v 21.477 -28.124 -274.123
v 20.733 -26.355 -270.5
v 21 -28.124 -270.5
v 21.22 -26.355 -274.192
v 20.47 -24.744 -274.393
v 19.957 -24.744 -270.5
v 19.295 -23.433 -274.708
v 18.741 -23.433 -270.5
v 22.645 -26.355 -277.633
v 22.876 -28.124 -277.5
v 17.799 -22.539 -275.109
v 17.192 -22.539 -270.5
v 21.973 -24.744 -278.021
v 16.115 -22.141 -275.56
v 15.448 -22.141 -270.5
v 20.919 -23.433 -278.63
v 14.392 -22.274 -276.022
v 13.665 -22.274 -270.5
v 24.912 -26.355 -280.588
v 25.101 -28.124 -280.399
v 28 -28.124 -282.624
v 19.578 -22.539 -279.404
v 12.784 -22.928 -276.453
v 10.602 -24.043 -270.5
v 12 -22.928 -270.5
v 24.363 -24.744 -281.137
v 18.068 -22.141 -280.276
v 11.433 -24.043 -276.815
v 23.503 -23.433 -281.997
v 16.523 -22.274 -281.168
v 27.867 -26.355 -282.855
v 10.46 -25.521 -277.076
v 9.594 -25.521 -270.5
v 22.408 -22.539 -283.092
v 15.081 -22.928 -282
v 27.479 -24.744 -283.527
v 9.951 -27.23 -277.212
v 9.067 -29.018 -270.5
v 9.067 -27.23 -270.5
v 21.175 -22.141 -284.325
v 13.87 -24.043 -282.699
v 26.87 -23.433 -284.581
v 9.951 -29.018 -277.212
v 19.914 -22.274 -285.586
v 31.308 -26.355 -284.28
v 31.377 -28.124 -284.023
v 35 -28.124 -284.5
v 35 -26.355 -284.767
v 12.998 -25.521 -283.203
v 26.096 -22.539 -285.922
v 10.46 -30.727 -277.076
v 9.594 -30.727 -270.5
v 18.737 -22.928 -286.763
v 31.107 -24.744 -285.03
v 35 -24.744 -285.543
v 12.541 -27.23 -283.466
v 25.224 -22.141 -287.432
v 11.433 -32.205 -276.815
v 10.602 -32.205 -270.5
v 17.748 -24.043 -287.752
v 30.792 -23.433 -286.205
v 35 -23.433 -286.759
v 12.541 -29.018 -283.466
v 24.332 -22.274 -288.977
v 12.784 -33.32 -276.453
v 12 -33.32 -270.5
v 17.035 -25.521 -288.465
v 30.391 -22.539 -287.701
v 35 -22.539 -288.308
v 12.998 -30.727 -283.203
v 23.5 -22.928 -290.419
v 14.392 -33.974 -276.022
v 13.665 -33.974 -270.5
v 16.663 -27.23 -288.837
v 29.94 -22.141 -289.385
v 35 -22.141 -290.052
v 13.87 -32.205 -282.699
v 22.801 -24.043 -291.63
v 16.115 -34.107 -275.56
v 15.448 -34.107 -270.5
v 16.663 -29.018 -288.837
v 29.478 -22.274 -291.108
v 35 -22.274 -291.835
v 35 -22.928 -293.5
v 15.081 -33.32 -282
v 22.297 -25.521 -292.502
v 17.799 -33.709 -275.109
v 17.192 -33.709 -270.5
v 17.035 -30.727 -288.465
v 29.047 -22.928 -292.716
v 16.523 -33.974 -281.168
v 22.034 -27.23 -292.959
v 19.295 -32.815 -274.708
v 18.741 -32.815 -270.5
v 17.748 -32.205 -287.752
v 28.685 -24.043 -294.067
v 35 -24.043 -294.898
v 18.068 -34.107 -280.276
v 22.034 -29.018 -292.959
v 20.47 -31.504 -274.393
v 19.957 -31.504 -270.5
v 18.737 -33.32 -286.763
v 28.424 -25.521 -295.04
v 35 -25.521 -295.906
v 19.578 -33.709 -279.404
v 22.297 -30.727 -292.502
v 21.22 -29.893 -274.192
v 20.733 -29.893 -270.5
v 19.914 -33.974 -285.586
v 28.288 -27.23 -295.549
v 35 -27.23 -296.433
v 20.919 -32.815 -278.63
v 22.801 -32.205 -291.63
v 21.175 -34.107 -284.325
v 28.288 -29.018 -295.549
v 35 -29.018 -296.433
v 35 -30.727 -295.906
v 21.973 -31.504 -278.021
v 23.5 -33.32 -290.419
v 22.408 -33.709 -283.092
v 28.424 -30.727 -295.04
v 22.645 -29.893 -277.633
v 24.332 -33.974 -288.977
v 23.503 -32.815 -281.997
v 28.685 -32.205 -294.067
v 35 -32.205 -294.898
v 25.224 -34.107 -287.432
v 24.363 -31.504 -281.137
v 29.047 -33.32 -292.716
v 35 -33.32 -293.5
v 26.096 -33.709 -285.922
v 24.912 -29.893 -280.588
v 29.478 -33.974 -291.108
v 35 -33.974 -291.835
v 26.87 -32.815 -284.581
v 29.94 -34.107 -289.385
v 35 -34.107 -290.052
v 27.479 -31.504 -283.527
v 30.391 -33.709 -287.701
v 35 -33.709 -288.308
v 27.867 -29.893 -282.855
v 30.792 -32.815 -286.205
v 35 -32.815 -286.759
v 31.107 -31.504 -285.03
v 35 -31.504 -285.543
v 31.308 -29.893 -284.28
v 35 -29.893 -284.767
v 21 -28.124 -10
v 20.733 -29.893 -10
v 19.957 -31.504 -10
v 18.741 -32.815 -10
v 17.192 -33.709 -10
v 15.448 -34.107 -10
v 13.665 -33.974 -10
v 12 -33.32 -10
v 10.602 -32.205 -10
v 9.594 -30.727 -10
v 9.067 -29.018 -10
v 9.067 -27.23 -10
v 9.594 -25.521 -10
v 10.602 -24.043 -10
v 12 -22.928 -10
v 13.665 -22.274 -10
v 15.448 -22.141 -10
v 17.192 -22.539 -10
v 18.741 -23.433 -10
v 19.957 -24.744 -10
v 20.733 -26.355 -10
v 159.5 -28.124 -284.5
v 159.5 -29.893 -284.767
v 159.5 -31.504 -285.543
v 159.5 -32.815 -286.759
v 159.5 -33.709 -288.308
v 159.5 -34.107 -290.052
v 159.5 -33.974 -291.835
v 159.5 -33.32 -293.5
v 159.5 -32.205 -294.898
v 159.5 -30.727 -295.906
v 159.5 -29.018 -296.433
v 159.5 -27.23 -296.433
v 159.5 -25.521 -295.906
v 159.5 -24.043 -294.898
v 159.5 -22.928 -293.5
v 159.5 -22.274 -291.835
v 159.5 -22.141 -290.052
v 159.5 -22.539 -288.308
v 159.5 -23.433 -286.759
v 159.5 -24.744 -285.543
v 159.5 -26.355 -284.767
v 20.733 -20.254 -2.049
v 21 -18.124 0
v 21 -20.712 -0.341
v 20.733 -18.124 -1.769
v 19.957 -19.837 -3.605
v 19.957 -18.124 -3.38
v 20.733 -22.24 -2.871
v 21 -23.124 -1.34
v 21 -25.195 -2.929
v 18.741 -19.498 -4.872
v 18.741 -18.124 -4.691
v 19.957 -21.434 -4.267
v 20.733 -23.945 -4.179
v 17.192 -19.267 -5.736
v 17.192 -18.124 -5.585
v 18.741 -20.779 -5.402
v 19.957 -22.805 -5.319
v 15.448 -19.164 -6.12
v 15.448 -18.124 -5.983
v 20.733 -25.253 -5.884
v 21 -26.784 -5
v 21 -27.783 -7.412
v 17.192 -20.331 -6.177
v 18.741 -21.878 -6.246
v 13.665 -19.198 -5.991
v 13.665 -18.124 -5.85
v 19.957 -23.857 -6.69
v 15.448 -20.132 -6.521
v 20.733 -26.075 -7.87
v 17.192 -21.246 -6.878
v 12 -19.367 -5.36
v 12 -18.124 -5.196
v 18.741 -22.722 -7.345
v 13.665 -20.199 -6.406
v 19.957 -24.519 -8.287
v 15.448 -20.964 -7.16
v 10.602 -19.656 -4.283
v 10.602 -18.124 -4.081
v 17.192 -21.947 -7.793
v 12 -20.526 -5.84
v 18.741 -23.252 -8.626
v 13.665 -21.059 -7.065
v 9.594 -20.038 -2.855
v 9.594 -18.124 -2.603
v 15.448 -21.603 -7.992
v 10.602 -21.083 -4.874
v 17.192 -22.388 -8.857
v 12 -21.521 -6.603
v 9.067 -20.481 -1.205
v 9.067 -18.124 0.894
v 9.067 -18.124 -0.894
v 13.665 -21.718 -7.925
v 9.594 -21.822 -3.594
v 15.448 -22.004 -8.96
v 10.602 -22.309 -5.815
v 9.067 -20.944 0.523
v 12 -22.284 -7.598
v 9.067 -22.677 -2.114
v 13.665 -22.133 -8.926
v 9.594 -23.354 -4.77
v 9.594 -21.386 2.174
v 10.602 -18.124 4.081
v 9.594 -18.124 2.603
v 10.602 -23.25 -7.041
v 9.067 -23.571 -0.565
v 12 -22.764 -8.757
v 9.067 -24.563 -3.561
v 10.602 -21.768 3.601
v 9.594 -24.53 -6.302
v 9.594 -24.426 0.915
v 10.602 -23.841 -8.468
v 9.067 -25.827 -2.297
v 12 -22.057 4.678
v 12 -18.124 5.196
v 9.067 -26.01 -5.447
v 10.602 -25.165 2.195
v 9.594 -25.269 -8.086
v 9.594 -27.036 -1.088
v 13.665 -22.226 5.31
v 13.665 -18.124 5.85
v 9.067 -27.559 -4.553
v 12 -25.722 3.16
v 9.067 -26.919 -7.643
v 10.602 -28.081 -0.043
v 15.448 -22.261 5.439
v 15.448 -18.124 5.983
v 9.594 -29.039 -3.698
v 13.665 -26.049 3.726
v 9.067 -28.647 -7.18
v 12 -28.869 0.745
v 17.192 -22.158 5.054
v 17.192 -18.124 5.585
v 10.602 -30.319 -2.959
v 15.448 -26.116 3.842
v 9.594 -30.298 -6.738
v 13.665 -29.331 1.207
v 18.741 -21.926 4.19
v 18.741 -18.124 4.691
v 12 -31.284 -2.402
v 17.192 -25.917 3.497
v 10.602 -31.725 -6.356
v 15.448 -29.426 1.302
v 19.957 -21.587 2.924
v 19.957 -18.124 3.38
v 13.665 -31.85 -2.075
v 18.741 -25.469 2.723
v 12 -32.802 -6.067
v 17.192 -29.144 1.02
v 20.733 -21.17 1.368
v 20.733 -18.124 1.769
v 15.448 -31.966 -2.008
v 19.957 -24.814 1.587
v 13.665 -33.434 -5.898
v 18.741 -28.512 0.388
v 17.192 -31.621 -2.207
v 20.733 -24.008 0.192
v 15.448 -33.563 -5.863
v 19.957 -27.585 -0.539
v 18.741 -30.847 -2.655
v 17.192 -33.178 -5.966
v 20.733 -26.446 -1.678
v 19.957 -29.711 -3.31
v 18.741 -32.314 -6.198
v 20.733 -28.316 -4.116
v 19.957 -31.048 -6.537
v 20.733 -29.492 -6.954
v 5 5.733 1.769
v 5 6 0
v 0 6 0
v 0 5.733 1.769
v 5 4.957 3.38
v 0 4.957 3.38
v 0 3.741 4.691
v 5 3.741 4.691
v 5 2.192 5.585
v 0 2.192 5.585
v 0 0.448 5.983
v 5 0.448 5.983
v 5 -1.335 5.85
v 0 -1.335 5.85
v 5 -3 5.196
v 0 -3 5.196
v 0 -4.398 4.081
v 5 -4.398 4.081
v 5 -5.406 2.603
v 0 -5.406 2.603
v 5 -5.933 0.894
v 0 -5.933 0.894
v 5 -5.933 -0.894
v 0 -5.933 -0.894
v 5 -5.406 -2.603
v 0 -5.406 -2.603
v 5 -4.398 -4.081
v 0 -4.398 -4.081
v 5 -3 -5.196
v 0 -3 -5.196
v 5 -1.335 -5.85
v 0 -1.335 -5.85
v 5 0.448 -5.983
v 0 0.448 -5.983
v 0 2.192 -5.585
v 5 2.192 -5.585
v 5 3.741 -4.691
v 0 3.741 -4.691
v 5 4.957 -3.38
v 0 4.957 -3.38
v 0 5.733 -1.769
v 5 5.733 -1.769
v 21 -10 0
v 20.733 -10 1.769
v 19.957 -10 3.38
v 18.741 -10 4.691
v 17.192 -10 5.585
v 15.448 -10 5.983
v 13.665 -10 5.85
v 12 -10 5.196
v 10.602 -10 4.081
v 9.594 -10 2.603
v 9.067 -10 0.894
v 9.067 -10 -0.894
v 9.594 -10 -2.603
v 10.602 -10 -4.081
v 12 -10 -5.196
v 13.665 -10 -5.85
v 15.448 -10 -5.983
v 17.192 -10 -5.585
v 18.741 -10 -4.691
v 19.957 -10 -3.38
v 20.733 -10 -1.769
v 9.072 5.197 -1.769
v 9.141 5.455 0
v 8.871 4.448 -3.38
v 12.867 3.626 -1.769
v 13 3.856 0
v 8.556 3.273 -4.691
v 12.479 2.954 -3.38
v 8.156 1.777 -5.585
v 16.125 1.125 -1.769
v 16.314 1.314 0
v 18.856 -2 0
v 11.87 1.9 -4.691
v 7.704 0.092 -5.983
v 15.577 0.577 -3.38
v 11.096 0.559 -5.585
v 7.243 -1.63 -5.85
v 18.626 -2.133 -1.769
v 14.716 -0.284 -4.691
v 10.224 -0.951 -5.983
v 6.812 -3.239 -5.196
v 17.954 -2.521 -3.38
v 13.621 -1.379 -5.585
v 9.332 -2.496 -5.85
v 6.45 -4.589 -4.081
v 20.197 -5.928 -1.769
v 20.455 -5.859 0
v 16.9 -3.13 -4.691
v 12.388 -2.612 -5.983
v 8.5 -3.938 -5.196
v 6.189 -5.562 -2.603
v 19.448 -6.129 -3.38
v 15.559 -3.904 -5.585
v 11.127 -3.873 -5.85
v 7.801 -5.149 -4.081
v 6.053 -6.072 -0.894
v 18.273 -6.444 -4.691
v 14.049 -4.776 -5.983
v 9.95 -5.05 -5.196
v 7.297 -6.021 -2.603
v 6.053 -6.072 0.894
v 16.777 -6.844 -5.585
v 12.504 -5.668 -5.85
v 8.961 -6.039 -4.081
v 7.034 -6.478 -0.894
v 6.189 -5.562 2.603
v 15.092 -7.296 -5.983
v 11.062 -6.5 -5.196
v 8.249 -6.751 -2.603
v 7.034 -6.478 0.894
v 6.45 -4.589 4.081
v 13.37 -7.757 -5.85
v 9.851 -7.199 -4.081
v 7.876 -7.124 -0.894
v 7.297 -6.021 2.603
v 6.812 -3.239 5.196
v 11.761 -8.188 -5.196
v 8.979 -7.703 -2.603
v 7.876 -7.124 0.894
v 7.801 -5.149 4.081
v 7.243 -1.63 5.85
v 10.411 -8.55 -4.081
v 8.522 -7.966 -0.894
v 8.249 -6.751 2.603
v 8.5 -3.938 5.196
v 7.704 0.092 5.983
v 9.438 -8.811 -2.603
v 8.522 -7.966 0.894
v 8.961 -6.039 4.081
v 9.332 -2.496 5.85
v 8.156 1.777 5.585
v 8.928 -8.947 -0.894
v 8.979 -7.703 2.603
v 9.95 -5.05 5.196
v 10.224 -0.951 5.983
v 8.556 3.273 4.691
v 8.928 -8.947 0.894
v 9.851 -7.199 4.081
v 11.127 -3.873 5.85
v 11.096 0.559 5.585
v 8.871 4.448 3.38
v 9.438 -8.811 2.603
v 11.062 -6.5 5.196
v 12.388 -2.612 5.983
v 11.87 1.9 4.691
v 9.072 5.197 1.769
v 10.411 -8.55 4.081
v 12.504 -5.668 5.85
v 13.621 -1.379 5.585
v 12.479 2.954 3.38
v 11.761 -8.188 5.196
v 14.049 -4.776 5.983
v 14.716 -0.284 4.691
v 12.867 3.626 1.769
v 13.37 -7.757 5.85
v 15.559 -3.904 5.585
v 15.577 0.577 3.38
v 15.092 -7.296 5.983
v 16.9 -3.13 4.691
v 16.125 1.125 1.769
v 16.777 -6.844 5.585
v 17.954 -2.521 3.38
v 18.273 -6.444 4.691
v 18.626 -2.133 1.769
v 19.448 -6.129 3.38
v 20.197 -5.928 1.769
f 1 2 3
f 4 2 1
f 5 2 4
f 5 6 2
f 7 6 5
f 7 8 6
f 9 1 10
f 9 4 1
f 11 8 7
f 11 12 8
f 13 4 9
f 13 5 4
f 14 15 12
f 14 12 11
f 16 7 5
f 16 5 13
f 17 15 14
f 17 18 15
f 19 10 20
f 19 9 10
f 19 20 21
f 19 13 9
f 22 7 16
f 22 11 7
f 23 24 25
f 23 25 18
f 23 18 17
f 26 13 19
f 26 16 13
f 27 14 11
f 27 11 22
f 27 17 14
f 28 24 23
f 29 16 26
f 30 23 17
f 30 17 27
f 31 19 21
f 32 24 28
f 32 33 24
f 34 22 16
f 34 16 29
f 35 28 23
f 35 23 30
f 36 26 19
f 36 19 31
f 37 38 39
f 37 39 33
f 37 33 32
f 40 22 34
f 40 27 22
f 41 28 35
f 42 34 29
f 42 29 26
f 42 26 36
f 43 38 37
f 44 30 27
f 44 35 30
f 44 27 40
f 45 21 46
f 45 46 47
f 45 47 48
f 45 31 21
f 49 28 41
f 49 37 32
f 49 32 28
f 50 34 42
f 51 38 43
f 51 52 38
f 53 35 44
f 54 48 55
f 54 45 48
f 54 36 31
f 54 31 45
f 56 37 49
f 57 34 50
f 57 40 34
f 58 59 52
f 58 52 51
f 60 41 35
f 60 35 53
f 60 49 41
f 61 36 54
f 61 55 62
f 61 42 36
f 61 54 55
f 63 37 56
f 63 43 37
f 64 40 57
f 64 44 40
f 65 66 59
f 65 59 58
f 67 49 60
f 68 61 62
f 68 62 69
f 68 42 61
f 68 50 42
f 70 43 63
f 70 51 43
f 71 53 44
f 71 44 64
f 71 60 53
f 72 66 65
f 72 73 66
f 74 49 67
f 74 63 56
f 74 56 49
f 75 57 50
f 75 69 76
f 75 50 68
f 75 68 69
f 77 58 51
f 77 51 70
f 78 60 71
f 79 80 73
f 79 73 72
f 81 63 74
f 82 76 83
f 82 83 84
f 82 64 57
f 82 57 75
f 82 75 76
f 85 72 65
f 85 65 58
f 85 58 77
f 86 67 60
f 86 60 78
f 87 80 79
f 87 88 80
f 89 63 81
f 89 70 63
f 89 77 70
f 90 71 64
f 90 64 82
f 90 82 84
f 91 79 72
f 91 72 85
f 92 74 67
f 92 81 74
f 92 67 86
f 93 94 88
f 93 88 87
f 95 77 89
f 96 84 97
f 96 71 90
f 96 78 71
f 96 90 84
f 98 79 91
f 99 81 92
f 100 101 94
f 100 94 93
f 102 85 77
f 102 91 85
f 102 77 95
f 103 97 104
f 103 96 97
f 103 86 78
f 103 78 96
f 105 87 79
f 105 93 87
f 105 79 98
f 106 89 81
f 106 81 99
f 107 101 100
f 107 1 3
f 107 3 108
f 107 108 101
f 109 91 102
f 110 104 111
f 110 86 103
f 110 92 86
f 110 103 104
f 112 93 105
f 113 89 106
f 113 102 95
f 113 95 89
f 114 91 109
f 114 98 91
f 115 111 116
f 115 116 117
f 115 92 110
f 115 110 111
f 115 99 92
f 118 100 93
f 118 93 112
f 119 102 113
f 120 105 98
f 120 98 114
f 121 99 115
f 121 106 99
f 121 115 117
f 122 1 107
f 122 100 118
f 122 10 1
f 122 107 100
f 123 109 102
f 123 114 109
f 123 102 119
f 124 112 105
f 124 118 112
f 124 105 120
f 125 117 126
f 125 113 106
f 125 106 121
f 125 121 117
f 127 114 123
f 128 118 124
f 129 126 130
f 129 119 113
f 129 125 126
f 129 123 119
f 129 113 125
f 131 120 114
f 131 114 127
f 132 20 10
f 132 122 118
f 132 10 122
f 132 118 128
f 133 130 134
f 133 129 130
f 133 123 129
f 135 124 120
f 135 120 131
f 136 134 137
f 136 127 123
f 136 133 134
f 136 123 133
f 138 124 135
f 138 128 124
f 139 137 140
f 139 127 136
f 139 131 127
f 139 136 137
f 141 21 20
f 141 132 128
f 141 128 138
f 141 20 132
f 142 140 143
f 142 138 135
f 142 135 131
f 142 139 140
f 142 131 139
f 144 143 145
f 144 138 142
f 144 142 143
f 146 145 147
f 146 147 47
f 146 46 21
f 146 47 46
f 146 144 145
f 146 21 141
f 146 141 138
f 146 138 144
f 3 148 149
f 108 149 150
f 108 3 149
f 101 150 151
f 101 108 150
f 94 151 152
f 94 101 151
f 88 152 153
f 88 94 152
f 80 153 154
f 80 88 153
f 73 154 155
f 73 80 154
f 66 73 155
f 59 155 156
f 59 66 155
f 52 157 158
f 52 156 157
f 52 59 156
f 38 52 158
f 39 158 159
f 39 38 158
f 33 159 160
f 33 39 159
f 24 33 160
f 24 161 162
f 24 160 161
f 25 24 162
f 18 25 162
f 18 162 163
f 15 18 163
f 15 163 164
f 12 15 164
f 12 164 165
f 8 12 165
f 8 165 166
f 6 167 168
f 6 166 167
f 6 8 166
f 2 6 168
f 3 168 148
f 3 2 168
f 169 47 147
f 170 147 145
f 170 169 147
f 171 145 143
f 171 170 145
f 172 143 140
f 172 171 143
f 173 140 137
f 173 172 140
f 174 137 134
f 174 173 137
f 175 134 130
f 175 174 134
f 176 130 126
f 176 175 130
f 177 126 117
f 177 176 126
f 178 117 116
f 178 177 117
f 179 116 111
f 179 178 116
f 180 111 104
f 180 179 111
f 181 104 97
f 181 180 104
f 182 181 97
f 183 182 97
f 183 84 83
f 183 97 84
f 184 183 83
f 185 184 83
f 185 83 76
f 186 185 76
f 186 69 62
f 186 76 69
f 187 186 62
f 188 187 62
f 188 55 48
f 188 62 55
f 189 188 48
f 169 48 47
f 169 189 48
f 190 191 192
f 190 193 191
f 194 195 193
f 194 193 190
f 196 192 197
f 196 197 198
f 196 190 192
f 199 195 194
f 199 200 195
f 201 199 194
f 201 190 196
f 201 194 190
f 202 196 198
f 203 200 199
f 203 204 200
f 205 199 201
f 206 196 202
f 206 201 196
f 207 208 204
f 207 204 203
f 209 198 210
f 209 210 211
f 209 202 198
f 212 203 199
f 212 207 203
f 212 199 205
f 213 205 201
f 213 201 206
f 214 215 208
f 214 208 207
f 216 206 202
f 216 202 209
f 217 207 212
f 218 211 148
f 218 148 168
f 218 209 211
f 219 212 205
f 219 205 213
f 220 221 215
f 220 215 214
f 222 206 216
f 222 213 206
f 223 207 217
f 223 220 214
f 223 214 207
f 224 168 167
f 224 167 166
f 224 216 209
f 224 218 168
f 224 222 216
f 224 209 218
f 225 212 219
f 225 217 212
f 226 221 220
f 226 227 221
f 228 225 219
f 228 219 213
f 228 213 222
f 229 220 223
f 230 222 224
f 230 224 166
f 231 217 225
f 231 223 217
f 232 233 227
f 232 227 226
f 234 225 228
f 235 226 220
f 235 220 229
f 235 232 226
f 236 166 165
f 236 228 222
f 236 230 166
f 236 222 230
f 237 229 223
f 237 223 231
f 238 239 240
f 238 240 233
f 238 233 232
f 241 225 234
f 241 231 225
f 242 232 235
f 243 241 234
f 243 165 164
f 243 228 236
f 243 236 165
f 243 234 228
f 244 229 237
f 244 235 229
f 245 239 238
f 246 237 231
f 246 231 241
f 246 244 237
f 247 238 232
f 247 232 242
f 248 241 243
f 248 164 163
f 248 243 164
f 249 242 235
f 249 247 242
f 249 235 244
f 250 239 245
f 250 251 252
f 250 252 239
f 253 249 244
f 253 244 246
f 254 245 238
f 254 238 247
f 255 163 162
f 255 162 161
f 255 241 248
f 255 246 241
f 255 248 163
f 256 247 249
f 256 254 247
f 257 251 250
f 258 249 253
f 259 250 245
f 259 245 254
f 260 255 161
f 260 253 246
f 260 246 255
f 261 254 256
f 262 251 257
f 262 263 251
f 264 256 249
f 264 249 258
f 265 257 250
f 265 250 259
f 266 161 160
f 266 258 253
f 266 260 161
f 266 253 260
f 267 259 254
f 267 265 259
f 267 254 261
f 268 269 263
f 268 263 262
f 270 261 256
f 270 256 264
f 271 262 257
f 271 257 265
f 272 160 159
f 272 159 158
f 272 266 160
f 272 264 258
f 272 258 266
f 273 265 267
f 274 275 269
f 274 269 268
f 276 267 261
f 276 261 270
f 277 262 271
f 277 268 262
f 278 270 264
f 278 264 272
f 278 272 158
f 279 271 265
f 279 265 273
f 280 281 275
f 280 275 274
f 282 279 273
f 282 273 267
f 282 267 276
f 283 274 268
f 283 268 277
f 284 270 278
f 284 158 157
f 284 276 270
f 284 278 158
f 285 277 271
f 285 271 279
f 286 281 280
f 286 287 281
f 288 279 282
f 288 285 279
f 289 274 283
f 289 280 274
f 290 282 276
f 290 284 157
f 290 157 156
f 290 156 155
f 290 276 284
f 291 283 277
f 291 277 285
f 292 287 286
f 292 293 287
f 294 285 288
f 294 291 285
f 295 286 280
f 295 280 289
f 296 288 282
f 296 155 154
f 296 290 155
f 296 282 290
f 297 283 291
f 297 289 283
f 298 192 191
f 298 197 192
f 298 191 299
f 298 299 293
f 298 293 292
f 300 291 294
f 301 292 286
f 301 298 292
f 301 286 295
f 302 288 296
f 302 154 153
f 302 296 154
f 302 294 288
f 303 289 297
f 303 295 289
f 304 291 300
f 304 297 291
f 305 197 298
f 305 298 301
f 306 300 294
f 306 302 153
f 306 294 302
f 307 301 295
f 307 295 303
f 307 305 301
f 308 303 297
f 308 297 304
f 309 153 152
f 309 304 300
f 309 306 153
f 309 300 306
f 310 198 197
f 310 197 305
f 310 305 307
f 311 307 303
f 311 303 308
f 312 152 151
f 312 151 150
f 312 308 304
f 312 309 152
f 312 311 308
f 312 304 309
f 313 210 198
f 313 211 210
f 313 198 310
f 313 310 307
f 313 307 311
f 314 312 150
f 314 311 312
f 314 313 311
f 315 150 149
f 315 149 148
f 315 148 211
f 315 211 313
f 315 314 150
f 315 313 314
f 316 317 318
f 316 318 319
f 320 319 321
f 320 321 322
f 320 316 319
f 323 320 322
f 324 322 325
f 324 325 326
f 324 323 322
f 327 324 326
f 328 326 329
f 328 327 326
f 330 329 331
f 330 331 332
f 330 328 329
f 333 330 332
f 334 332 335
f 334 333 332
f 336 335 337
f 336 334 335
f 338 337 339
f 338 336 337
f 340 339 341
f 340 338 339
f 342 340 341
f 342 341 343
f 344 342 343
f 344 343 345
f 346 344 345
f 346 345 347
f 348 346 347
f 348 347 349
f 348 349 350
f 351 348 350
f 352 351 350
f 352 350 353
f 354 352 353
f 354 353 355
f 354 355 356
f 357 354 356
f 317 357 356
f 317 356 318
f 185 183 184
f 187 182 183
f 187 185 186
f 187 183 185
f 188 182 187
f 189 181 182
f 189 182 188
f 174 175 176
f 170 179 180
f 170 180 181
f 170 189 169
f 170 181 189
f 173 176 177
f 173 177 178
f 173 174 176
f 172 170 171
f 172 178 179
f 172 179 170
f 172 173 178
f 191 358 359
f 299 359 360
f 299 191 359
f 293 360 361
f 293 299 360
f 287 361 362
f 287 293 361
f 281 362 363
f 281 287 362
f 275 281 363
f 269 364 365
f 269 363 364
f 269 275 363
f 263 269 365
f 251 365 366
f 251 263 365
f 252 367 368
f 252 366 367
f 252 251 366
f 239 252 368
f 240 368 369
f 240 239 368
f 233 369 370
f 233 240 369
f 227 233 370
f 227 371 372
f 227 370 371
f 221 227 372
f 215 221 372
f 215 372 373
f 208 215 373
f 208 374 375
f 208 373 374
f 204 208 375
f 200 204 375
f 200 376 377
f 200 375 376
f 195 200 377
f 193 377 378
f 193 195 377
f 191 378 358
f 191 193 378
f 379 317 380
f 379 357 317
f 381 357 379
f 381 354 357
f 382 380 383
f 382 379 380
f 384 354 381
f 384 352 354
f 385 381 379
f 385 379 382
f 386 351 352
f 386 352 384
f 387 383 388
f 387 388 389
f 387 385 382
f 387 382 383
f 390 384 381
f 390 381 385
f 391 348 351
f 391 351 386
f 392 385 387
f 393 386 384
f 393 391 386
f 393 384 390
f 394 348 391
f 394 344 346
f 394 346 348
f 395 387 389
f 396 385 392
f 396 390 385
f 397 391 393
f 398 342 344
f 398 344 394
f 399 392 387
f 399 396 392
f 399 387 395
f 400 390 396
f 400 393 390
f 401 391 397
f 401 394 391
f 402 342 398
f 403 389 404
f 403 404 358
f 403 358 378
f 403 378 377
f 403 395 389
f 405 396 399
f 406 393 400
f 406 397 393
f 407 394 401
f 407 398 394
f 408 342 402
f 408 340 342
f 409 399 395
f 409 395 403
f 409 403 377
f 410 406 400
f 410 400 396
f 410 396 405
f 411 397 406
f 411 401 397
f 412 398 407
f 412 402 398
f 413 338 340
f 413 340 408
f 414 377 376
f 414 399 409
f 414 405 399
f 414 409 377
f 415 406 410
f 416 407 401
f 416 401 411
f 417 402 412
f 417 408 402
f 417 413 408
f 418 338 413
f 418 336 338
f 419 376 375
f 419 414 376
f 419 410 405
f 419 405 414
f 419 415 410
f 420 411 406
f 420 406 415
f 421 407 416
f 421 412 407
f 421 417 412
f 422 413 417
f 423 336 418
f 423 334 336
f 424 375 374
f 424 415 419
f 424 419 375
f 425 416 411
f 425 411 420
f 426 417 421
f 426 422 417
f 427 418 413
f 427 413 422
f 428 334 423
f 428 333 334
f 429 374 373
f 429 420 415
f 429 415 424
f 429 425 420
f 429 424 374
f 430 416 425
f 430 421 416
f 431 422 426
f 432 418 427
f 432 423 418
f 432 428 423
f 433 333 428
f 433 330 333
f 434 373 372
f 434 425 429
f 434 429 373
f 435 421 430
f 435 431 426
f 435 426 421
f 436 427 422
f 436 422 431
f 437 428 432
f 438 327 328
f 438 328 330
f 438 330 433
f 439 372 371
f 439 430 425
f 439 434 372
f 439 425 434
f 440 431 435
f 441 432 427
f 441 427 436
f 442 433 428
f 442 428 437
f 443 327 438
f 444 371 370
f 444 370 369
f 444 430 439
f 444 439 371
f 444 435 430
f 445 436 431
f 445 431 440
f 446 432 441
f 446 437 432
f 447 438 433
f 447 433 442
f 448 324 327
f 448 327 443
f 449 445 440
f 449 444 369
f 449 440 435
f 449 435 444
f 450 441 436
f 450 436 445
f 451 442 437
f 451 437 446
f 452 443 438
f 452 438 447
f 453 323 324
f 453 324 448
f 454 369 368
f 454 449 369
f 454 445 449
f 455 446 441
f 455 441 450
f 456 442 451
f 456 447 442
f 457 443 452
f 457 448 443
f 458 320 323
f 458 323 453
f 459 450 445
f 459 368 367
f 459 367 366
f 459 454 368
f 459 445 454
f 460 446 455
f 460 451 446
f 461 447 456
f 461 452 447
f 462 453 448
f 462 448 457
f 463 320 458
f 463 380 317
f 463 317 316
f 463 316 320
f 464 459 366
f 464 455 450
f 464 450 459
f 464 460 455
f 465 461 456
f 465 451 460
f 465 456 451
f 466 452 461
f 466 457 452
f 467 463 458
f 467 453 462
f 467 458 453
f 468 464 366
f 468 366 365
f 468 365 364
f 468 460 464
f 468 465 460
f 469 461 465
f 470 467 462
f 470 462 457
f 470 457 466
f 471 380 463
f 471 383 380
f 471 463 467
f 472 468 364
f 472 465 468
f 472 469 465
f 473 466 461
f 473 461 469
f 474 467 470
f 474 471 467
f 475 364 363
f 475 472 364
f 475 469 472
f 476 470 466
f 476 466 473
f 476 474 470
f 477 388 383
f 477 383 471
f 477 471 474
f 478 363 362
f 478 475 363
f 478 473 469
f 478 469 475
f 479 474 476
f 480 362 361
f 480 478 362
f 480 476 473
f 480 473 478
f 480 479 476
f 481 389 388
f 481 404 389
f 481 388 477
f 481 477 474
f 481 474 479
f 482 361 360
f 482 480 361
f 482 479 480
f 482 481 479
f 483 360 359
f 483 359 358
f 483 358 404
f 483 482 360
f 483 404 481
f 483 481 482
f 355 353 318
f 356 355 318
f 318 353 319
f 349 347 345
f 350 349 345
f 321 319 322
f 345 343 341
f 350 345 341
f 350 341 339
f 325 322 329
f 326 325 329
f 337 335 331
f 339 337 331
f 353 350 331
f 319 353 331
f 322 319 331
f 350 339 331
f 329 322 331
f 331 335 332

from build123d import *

# Parameters (mm, degrees)
F5_R = 6


with BuildPart() as f6:
    # F6: sweep along a path in F0, F4, F2
    with BuildLine(Plane.XY) as f6_path:
        Line((0, 0), (5, 0))
        ThreePointArc((5, 0), (12.0710678119, -2.9289321881), (15, -10))
        Line((15, -10), (15, -18.124))
    with BuildLine(Plane.YZ.offset(15)) as f6_path_2:
        ThreePointArc((-18.124, 0), (-25.1950678119, -2.9289321881), (-28.124, -10))
        Line((-28.124, -10), (-28.124, -20))
    with BuildLine(Plane.XZ.offset(28.124)) as f6_path_3:
        Line((15, -20), (15, -270.5))
        ThreePointArc((15, -270.5), (20.8578643763, -284.6421356237), (35, -290.5))
        Line((35, -290.5), (159.5, -290.5))
    # F5 (on Right) → F6 (sweep)
    with BuildSketch(Plane.YZ):
        Circle(F5_R)
    sweep(path=f6_path.line + f6_path_2.line + f6_path_3.line)


solid = f6.part
